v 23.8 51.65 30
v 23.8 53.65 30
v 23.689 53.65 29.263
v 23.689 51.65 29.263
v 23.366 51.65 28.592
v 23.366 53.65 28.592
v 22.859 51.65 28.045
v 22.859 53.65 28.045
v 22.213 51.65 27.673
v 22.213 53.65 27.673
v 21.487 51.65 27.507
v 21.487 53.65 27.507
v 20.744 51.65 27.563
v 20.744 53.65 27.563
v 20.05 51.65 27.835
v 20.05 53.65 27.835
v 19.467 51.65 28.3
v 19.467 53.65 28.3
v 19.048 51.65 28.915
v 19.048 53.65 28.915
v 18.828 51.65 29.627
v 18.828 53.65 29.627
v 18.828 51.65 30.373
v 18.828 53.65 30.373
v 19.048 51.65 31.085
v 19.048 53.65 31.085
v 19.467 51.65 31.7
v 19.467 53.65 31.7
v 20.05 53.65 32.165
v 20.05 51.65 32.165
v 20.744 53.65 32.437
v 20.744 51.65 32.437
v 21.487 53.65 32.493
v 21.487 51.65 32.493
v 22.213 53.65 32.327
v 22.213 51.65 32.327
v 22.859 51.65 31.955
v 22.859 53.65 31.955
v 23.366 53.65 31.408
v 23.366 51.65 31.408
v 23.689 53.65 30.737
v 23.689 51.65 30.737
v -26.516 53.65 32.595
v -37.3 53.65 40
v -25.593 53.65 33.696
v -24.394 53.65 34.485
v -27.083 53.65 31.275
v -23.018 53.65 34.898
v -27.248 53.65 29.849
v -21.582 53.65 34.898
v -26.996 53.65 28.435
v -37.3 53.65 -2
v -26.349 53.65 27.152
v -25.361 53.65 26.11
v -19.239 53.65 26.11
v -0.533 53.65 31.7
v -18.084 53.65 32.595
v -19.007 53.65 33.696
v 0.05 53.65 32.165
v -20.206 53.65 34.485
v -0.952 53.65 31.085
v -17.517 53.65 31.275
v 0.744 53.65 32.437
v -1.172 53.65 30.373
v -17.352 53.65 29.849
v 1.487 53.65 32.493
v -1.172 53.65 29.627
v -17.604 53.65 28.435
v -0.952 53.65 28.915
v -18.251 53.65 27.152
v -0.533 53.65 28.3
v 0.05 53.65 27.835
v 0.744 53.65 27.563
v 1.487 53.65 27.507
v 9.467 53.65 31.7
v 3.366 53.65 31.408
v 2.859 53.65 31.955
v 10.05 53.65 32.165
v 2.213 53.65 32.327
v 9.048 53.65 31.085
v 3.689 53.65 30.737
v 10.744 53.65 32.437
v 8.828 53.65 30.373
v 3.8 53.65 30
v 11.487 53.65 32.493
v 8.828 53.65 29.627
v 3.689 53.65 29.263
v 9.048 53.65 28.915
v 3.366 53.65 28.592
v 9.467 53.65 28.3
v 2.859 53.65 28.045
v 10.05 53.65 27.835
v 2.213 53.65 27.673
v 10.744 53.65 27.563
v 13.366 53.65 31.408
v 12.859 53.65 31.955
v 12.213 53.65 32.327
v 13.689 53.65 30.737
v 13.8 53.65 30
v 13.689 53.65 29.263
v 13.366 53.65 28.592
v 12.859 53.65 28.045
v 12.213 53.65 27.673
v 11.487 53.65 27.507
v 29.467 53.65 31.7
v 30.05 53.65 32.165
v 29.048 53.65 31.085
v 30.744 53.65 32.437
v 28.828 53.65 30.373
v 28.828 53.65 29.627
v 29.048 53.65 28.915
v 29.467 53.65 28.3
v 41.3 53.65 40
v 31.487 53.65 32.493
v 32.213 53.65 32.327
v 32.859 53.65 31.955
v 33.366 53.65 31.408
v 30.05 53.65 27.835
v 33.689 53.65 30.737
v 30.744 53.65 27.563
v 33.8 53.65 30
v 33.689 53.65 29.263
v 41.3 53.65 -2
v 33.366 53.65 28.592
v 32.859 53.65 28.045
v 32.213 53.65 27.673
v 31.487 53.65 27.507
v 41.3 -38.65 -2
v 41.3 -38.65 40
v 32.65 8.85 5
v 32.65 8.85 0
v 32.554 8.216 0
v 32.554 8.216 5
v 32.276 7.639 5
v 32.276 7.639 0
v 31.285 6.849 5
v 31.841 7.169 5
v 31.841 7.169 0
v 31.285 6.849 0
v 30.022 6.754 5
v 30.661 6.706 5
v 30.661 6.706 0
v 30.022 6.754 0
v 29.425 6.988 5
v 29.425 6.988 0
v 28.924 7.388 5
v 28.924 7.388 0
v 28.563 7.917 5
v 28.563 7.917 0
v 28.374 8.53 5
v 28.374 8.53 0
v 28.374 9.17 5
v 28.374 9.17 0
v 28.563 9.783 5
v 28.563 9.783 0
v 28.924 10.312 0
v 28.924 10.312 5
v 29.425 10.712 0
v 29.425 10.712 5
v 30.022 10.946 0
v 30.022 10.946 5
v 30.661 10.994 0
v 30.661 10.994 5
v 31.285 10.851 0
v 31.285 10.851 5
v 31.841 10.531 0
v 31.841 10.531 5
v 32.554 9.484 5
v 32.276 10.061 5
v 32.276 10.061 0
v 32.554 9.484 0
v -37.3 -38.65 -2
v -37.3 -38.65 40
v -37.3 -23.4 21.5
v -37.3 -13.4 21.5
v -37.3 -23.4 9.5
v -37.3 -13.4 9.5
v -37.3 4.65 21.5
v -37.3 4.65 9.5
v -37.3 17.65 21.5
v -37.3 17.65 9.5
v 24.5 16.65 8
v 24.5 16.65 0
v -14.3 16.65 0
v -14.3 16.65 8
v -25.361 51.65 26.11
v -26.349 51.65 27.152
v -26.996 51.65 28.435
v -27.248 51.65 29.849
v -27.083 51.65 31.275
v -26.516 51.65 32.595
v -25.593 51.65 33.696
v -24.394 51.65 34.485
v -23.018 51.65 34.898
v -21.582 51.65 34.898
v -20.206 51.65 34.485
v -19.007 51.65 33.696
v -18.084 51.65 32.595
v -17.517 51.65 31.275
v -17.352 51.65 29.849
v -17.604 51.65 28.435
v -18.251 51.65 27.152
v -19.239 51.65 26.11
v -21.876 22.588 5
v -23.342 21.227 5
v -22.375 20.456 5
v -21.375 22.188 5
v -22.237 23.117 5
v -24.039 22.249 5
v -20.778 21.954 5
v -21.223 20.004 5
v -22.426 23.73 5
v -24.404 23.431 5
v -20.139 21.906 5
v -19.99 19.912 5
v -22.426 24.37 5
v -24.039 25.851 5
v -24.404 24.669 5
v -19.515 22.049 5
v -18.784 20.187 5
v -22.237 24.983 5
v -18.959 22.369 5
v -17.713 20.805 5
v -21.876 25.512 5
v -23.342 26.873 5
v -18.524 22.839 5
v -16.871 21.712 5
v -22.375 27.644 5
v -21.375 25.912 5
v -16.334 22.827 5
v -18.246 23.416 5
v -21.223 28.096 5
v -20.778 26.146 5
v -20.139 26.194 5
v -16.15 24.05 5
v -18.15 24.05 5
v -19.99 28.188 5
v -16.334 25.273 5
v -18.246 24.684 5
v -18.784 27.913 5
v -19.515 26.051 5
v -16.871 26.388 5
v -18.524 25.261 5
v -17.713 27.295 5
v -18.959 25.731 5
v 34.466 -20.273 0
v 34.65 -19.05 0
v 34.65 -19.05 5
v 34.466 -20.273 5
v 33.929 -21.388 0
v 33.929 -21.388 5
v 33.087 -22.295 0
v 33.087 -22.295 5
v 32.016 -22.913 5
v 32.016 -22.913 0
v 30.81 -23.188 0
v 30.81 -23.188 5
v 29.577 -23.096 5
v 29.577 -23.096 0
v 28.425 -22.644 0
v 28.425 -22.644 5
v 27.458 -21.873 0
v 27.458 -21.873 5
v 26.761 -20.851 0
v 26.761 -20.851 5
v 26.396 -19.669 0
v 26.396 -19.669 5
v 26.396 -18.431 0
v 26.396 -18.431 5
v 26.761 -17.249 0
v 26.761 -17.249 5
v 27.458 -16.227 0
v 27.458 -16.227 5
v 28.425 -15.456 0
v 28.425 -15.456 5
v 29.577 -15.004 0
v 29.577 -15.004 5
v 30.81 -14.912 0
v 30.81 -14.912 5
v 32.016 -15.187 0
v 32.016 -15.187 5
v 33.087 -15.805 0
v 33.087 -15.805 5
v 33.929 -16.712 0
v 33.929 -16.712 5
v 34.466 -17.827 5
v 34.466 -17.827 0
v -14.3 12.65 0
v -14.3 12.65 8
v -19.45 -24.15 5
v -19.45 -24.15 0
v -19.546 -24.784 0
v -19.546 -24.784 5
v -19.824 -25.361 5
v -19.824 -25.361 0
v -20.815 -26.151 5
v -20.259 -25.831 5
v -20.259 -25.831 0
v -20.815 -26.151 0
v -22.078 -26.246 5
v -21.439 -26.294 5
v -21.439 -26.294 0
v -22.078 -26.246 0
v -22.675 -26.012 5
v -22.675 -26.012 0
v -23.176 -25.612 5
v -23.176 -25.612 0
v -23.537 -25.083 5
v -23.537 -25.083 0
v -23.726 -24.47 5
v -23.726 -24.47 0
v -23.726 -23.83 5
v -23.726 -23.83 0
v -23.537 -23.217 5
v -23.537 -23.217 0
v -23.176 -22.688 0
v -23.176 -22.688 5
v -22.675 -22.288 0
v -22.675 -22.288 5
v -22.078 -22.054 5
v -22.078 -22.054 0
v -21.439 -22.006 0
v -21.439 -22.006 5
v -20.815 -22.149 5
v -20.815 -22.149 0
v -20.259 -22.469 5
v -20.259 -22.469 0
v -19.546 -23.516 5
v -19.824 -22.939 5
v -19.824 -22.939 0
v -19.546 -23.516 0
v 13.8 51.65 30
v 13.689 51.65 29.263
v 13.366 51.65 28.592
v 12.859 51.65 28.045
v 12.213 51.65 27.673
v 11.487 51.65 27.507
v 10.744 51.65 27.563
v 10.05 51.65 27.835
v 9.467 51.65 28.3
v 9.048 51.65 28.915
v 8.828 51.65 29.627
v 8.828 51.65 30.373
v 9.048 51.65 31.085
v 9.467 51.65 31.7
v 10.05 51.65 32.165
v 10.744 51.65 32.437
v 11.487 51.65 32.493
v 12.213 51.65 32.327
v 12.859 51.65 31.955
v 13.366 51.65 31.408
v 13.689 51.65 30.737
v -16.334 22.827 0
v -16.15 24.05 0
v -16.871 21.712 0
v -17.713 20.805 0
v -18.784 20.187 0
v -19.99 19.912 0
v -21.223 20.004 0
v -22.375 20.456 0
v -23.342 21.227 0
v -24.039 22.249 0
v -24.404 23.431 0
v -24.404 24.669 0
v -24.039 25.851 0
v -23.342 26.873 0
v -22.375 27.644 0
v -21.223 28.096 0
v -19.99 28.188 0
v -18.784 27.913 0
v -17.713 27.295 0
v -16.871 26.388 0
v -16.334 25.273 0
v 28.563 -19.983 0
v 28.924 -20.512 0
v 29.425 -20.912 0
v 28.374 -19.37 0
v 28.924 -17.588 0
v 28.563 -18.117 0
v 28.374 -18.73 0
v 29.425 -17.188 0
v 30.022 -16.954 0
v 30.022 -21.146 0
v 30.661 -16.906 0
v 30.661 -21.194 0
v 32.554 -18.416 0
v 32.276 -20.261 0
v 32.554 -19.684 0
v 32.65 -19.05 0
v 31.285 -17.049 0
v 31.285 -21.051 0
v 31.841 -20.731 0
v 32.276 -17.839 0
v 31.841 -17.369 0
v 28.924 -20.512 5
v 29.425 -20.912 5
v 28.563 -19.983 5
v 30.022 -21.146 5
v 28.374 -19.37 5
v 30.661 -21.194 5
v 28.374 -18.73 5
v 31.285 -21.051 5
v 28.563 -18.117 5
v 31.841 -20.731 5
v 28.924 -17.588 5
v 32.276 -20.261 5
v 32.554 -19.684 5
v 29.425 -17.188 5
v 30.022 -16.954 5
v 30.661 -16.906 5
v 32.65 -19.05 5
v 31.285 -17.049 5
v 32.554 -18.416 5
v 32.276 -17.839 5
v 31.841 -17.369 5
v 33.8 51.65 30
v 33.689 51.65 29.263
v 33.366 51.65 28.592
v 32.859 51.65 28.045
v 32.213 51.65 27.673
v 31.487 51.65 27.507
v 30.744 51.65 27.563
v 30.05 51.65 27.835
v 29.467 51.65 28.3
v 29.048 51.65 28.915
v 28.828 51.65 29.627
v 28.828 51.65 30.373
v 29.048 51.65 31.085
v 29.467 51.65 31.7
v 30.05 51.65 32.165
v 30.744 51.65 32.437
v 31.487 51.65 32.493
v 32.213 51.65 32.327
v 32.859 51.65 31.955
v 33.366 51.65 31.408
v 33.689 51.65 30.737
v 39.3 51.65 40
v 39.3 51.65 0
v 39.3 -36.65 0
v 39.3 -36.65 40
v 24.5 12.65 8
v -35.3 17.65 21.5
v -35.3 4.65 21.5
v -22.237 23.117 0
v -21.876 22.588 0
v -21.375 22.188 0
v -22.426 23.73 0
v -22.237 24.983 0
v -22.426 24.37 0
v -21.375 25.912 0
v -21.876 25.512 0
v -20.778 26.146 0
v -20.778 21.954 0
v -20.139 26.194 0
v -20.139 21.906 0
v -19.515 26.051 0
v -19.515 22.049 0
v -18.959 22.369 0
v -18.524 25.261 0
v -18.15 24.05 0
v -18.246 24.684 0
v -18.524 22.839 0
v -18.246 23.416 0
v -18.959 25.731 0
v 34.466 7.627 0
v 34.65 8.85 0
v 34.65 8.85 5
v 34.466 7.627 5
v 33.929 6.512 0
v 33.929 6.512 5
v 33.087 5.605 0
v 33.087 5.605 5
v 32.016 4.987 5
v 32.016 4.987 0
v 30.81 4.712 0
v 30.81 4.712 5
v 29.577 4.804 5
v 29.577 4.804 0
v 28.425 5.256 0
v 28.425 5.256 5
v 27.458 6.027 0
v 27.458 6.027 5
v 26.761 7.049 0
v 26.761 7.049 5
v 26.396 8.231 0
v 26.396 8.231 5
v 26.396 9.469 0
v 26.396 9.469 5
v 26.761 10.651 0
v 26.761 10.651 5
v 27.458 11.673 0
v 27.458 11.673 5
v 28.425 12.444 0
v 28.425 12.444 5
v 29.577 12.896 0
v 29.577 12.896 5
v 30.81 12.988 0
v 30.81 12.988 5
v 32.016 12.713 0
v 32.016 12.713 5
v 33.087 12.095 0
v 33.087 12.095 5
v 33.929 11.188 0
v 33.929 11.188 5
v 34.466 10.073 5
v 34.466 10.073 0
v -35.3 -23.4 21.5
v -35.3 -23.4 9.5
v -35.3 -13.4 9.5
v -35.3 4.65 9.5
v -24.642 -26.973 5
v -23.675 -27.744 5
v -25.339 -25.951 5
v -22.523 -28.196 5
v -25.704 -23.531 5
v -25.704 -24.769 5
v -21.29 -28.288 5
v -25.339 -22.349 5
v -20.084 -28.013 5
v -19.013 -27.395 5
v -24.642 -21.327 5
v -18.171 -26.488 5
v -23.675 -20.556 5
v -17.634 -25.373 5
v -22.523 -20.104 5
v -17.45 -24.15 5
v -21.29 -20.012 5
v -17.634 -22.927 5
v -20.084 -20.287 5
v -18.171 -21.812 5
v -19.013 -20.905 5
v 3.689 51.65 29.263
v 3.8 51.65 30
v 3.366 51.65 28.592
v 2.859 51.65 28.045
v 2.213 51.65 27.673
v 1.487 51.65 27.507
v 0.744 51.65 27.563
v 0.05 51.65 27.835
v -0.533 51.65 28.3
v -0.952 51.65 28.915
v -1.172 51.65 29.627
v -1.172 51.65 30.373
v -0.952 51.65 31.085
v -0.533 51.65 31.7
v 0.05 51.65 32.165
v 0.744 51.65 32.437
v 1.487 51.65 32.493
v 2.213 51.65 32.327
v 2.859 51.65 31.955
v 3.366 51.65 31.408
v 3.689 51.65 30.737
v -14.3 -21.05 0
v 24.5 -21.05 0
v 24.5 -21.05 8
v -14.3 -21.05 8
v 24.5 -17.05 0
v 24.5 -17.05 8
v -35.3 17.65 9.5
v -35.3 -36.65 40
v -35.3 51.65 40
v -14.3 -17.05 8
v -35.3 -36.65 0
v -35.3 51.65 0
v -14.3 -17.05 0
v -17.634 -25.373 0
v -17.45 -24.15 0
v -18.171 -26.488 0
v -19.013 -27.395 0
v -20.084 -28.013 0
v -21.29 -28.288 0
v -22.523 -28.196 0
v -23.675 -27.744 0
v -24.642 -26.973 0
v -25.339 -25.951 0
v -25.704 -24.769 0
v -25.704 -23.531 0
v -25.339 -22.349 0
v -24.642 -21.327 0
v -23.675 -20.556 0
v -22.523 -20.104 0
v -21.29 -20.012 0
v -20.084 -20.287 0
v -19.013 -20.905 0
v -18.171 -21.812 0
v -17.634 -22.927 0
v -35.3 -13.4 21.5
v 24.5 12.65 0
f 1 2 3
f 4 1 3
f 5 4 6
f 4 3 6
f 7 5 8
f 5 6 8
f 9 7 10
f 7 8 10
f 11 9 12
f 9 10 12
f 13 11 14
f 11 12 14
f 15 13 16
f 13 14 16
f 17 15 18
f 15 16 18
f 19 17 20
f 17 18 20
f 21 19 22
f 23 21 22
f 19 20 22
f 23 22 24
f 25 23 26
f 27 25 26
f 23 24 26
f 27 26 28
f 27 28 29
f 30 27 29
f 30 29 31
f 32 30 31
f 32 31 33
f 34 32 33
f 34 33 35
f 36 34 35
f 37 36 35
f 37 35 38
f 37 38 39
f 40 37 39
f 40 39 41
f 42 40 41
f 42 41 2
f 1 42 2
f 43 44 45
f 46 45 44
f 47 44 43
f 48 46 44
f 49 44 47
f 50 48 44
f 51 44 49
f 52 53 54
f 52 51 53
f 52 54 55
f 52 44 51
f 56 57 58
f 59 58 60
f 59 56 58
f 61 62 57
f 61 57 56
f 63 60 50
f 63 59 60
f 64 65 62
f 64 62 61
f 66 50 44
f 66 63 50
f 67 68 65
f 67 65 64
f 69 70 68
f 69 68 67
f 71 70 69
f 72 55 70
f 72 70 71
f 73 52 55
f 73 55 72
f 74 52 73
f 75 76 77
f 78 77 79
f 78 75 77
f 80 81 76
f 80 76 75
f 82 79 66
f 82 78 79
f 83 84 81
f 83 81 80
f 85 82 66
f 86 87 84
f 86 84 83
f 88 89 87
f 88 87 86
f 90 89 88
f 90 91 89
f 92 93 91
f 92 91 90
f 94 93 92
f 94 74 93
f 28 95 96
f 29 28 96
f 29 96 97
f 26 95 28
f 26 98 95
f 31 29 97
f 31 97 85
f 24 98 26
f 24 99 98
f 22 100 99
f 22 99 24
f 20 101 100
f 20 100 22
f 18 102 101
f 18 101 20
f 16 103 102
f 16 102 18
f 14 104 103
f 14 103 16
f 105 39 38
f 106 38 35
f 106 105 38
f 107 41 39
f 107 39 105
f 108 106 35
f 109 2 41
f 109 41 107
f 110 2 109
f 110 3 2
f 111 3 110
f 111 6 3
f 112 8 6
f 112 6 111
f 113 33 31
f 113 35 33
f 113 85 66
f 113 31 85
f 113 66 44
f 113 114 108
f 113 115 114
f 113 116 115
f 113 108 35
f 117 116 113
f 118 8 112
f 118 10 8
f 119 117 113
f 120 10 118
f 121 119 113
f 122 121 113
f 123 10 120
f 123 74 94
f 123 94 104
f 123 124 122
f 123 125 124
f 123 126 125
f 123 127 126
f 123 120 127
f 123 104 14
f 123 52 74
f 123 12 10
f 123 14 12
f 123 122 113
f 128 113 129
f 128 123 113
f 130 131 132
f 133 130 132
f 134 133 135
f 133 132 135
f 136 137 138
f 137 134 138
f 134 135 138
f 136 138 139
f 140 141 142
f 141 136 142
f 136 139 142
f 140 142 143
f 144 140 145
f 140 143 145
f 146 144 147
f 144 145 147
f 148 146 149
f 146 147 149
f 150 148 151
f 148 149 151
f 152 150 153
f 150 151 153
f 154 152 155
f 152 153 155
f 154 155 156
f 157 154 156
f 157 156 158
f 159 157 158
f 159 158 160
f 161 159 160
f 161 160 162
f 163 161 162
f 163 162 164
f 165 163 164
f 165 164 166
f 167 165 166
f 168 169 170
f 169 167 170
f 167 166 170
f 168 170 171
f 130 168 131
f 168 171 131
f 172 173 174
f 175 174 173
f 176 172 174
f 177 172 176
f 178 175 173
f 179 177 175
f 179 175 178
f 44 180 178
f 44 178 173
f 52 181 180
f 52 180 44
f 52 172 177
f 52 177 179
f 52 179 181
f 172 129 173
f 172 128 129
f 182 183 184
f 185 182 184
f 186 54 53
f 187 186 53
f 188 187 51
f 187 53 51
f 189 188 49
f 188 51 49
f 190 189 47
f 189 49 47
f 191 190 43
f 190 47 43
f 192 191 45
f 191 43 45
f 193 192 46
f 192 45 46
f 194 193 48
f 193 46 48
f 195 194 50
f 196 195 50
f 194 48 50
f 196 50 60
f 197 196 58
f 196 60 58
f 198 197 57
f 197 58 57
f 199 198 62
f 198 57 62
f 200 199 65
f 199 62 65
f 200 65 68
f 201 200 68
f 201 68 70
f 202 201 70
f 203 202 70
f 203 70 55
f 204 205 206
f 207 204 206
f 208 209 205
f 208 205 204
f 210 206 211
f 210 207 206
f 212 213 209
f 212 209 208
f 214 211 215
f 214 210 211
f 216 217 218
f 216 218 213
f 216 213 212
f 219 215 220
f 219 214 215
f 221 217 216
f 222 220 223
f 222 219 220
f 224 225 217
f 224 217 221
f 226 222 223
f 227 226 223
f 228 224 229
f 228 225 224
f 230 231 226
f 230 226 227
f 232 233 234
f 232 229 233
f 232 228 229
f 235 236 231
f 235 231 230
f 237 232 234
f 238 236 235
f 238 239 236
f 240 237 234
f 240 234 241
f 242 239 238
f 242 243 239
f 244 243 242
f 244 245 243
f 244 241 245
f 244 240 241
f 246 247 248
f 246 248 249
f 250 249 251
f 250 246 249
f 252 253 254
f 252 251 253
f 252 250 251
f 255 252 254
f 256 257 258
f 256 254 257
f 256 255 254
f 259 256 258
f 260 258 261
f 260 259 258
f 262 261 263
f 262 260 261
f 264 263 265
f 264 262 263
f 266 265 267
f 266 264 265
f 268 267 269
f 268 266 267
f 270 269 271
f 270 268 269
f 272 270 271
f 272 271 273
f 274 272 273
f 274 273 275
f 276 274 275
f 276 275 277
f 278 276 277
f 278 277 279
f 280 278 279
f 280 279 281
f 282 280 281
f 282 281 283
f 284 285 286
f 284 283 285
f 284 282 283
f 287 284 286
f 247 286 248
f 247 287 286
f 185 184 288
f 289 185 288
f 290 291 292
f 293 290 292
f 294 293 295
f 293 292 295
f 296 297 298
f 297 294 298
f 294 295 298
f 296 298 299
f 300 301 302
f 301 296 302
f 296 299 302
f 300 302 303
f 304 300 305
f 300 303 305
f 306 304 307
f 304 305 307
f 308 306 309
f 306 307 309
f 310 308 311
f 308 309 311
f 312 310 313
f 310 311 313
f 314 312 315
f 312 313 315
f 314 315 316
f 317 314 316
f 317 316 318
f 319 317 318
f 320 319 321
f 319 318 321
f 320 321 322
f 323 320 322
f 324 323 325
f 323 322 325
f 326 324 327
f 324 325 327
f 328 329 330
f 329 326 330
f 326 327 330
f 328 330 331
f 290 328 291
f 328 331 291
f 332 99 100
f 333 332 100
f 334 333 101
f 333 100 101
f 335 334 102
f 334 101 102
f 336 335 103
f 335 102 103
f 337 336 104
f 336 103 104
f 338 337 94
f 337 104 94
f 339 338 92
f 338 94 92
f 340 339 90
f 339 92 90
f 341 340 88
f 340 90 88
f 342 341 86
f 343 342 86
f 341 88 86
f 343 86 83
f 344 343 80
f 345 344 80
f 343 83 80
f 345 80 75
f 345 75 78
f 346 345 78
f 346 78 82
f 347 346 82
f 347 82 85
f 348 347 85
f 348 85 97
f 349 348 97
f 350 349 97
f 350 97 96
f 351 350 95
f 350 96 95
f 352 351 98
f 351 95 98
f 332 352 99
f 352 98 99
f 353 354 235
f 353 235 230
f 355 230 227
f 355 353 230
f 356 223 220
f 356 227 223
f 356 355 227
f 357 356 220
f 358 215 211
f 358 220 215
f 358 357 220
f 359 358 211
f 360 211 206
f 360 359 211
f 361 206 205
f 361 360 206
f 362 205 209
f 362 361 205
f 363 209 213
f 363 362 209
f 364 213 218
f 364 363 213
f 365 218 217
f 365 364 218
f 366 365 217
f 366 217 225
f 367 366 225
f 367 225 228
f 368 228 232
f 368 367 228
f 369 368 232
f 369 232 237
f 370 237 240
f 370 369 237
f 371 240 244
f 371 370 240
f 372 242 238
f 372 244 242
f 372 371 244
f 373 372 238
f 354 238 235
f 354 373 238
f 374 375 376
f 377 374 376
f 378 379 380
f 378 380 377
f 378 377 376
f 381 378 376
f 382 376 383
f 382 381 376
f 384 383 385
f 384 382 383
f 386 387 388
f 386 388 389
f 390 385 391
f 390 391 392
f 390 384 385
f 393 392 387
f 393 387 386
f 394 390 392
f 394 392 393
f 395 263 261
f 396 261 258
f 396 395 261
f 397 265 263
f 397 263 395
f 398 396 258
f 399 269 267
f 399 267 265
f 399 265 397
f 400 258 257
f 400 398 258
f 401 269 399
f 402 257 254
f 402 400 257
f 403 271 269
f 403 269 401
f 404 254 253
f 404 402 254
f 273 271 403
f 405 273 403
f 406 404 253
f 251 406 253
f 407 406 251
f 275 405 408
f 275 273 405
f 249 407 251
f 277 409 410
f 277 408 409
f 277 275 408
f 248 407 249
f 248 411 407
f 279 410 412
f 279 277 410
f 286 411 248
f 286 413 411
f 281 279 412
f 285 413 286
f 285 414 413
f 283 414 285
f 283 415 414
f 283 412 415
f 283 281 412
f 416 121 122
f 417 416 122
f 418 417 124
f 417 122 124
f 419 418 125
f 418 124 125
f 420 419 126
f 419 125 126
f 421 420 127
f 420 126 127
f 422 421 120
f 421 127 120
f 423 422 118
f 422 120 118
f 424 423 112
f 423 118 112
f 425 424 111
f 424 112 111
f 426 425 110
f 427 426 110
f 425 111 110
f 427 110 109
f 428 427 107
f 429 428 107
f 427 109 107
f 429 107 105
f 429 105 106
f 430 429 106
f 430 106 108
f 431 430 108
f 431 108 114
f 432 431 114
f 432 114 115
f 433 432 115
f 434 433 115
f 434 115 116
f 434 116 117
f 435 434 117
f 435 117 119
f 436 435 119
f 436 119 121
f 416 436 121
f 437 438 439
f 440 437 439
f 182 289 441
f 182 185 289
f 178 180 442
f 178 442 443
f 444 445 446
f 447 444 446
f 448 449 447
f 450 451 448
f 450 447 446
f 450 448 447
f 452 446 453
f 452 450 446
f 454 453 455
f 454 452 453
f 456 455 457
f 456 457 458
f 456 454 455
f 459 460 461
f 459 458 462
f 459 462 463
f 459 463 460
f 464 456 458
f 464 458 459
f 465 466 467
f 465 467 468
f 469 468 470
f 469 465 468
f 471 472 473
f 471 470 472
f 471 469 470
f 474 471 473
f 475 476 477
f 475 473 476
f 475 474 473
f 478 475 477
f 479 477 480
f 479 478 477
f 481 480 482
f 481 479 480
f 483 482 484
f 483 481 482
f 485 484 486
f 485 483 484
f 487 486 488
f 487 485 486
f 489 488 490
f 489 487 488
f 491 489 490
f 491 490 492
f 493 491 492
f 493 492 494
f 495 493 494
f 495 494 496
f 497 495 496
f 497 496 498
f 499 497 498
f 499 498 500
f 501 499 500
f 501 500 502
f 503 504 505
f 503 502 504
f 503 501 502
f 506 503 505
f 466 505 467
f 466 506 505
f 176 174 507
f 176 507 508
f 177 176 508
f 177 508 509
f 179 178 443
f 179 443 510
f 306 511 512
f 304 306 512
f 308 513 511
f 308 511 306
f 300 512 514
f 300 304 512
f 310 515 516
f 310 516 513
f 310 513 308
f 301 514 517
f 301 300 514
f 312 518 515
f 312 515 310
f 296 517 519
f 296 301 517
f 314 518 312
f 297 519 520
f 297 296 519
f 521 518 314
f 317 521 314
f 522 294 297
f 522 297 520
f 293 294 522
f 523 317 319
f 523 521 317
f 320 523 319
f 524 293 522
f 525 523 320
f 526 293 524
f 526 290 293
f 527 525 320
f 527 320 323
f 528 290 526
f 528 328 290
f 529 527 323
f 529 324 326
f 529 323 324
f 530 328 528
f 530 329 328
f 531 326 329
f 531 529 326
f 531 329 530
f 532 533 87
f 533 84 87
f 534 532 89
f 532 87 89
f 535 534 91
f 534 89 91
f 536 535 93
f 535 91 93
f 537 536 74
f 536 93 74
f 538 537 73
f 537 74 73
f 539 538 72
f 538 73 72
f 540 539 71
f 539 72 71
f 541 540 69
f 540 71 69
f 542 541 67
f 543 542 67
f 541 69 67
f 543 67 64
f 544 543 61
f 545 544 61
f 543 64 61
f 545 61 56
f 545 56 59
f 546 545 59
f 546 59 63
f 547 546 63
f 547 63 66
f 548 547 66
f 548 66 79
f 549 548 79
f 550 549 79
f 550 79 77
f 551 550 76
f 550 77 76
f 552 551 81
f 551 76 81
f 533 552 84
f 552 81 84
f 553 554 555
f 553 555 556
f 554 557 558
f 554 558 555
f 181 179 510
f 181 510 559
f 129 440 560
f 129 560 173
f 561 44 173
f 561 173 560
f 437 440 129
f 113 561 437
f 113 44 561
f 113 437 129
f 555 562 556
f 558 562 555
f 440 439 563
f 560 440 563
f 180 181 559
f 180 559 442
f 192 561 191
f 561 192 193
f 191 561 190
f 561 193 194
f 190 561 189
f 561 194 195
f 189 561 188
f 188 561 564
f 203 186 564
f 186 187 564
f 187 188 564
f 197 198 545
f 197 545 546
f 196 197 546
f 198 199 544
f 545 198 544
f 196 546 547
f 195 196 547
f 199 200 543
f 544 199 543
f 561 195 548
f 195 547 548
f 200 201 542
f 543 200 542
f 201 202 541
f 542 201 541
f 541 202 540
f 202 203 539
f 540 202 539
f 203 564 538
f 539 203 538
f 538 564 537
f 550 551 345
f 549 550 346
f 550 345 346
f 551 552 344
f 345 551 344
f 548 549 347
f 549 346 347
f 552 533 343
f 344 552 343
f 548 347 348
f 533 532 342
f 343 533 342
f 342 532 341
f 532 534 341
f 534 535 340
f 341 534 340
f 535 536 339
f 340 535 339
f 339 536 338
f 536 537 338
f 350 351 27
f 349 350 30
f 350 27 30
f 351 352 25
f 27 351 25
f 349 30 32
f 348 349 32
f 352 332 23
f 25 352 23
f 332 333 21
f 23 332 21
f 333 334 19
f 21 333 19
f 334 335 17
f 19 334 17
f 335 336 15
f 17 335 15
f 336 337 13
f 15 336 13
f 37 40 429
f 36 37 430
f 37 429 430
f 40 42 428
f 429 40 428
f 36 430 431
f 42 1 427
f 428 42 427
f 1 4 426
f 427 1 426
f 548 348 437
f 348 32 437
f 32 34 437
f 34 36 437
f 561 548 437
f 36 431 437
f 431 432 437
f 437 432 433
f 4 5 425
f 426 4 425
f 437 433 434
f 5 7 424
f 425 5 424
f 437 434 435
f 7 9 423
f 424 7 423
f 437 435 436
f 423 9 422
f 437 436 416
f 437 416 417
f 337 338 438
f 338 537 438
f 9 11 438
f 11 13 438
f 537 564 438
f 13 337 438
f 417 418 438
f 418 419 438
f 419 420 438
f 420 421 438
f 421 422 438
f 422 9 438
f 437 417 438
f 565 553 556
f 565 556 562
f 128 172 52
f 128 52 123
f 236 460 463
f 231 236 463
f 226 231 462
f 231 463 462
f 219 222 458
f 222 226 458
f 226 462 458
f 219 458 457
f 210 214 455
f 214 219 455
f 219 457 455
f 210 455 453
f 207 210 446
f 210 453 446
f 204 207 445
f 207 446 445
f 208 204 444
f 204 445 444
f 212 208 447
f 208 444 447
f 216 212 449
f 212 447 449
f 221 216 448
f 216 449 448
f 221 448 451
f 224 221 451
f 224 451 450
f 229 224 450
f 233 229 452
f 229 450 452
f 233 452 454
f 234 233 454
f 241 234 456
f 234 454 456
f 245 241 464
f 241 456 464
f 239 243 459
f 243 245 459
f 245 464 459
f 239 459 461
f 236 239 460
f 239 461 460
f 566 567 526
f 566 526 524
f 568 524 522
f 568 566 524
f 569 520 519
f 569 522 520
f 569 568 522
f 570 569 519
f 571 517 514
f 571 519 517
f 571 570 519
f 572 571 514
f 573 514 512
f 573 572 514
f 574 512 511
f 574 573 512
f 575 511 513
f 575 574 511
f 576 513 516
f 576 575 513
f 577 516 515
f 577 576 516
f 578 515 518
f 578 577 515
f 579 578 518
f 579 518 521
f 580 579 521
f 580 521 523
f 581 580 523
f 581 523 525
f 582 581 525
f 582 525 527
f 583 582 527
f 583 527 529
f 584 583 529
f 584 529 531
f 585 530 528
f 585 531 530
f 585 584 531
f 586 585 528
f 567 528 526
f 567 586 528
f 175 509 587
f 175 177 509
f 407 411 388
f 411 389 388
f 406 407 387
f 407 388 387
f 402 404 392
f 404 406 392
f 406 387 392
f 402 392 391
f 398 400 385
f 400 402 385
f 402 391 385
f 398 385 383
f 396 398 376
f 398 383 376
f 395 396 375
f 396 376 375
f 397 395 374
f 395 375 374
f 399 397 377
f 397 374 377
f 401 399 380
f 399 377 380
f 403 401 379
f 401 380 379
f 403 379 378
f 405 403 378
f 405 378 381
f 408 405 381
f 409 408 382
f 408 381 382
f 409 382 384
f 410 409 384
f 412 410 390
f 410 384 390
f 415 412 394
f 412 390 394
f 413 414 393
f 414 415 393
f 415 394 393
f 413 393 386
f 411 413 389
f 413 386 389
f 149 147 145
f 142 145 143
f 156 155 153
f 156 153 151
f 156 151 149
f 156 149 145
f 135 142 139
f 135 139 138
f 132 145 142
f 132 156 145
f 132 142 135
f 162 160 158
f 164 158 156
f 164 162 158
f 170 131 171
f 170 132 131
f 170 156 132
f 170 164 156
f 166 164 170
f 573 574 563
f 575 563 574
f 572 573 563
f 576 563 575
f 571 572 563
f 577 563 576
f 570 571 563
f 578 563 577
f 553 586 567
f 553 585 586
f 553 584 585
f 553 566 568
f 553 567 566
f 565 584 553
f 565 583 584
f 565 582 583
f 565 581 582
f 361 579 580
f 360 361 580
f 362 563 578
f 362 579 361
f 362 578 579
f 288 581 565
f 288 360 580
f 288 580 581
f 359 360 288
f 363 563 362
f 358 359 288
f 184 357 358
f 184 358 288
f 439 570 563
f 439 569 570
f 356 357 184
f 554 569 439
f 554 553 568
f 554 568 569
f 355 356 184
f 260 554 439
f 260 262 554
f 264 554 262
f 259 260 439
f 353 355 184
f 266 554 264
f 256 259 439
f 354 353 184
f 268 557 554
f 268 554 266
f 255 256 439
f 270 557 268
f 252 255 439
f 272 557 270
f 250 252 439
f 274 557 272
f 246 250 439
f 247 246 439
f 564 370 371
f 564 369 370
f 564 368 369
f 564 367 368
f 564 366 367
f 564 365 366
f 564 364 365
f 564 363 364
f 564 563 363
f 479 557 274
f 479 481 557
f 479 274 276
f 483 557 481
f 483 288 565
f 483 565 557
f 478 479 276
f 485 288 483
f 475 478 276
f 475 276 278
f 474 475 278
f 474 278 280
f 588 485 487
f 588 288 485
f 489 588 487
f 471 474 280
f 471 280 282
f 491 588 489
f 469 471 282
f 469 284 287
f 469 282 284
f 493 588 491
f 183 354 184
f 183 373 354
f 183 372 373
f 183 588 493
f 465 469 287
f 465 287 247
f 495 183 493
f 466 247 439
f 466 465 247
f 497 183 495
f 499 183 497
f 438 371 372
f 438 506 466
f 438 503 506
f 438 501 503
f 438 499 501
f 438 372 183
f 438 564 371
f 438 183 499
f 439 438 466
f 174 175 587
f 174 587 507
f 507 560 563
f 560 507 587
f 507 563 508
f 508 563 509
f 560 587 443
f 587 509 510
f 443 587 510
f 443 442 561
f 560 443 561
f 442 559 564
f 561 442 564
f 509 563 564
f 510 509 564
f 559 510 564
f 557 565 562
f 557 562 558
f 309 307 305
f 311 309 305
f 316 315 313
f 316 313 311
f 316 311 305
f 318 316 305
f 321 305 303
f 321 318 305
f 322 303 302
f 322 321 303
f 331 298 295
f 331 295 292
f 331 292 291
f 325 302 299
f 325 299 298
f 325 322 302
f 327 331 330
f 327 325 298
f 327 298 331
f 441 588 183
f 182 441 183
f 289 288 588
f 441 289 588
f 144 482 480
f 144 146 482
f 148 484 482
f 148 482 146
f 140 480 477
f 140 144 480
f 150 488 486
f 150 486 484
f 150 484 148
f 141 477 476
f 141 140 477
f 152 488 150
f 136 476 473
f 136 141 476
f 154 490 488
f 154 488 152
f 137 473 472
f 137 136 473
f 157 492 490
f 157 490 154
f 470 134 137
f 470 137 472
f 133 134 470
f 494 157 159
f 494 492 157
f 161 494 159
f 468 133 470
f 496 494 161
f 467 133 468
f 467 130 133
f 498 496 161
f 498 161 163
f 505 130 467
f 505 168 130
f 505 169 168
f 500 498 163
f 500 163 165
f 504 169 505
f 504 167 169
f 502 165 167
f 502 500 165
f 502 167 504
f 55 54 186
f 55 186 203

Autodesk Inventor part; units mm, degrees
ref_plane "YZ Plane" through (0, 0, 0) normal (1, 0, 0) x (0, 1, 0)
ref_plane "XZ Plane" through (0, 0, 0) normal (0, 1, 0) x (-1, 0, 0)
ref_plane "XY Plane" through (0, 0, 0) normal (0, 0, 1) x (1, 0, 0)
sketch "Sketch1" plane through (0, 0, 0) normal (0, 0, 1) x (1, 0, 0)
  line L0 (-35.3, 51.65) -> (39.3, 51.65)
  line L1 (39.3, 51.65) -> (39.3, -36.65)
  line L2 (39.3, -36.65) -> (-35.3, -36.65)
  line L3 (-35.3, -36.65) -> (-35.3, 51.65)
  line L4 (-35.3, 51.65) -> (39.3, -36.65) construction
  line L5 (39.3, 51.65) -> (-35.3, -36.65) construction
  line L6 (34.3, 26.65) -> (-34.3, 26.65) construction
  line L7 (-34.3, 26.65) -> (-34.3, -26.65) construction
  line L8 (-34.3, -26.65) -> (34.3, -26.65) construction
  line L9 (34.3, -26.65) -> (34.3, 26.65) construction
  line L10 (34.3, 26.65) -> (-34.3, -26.65) construction
  line L11 (-34.3, 26.65) -> (34.3, -26.65) construction
  circle A0 centre (-20.3, 24.05) radius 1.6 construction
  circle A1 centre (-21.6, -24.15) radius 1.6 construction
  circle A2 centre (30.5, 8.85) radius 1.6 construction
  circle A3 centre (30.5, -19.05) radius 1.6 construction
  line L12 (-37.3, 53.65) -> (41.3, 53.65)
  line L13 (41.3, 53.65) -> (41.3, -38.65)
  line L14 (41.3, -38.65) -> (-37.3, -38.65)
  line L15 (-37.3, -38.65) -> (-37.3, 53.65)
  line L16 (-37.3, 53.65) -> (41.3, -38.65) construction
  line L17 (41.3, 53.65) -> (-37.3, -38.65) construction
  line L18 (30.5, 53.65) -> (30.5, -38.65) construction
  point P0 (0, 0)
  dimension "d82" = 6
  dimension "d0" = 53.3
  dimension "d2" = 68.6
  dimension "d3" = 14
  dimension "d4" = 2.5
  dimension "d5" = 50.8
  dimension "d6" = 27.9
  dimension "d7" = 5.1
  dimension "d8" = 3.2
  dimension "d9" = 25
  dimension "d10" = 1
  dimension "d11" = 2
  dimension "d12" = 2
  dimension "d59" = 5
  dimension "d62" = 10
  dimension "d63" = 2
  dimension "d64" = 2
  dimension "d92" = 15.2
  dimension "d94" = 1.3
extrude "Extrusion1" add sketch "Sketch1" against normal blind 2 contours L0 L1 L2 L3 | L12 L13 L14 L15
extrude "Extrusion2" add sketch "Sketch1" along normal blind 40
sketch "Sketch2" plane through (0, 0, 0) normal (0, 0, 1) x (1, 0, 0)
  circle A0 centre (-21.6, -24.15) radius 1.6 construction
  circle A1 centre (-20.3, 24.05) radius 4.15
  circle A2 centre (-21.6, -24.15) radius 4.15
  circle A3 centre (30.5, -19.05) radius 4.15
  circle A4 centre (30.5, 8.85) radius 4.15
  circle A5 centre (-20.3, 24.05) radius 2.15
  circle A6 centre (30.5, 8.85) radius 2.15
  circle A7 centre (-21.6, -24.15) radius 2.15
  circle A8 centre (30.5, -19.05) radius 2.15
  point P0 (0, 0)
  dimension "d17" = 8.3
  dimension "d19" = 4.3
extrude "Extrusion3" add sketch "Sketch2" along normal blind 5
sketch "Sketch7" plane through (0, 0, 0) normal (0, 0, 1) x (1, 0, 0)
  circle A0 centre (30.5, -19.05) radius 4.15 projected
  circle A1 centre (30.5, 8.85) radius 4.15 projected
  line L0 (-14.3, -17.05) -> (24.5, -17.05)
  line L1 (24.5, -17.05) -> (24.5, -21.05)
  line L2 (24.5, -21.05) -> (-14.3, -21.05)
  line L3 (-14.3, -21.05) -> (-14.3, -17.05)
  line L4 (-34.3, -26.65) -> (34.3, -26.65) construction
  line L5 (34.3, 26.65) -> (-34.3, 26.65) construction
  line L6 (34.3, -26.65) -> (34.3, 26.65) construction
  line L7 (-34.3, 26.65) -> (-34.3, -26.65) construction
  line L8 (24.5, 16.65) -> (-14.3, 16.65)
  line L9 (-14.3, 16.65) -> (-14.3, 12.65)
  line L10 (-14.3, 12.65) -> (24.5, 12.65)
  line L11 (24.5, 12.65) -> (24.5, 16.65)
  point P0 (0, 0)
  point P1 (24.5, -19.05)
  dimension "d79" = 4
  dimension "d80" = 20
  dimension "d81" = 6
  dimension "d82" = 6
  dimension "d83" = 20
  dimension "d86" = 10
  dimension "d87" = 0
extrude "Extrusion7" add sketch "Sketch7" along normal blind 8 contours L0 L1 L2 L3 | L11 L10 L9 L8
sketch "Sketch4" plane through (-37.3, -38.65, -2) normal (-1, 0, 0) x (0, 0, 1)
  line L0 (11.5, 56.3) -> (23.5, 56.3)
  line L1 (23.5, 56.3) -> (23.5, 43.3)
  line L2 (23.5, 43.3) -> (11.5, 43.3)
  line L3 (11.5, 43.3) -> (11.5, 56.3)
  line L4 (11.5, 56.3) -> (23.5, 43.3) construction
  line L5 (23.5, 56.3) -> (11.5, 43.3) construction
  line L6 (23.5, 15.25) -> (11.5, 15.25)
  line L7 (11.5, 15.25) -> (11.5, 25.25)
  line L8 (11.5, 25.25) -> (23.5, 25.25)
  line L9 (23.5, 25.25) -> (23.5, 15.25)
  line L10 (23.5, 15.25) -> (11.5, 25.25) construction
  line L11 (11.5, 15.25) -> (23.5, 25.25) construction
  line L12 (2, 0) -> (2, 92.3) projected
  line L13 (7, 58.55) -> (7, 66.85) projected
  line L14 (10, 21.6) -> (10, 17.6) projected
  line L15 (0, 92.3) -> (42, 92.3) projected
  line L16 (0, 0) -> (0, 92.3) projected
  line L17 (42, 0) -> (0, 0) projected
  line L18 (42, 92.3) -> (42, 0) projected
  point P0 (2, 38.65)
  point P1 (2, 65.3)
  point P2 (2, 65.3)
  point P3 (2, 65.3)
  point P4 (2, 12)
  point P5 (2, 12)
  point P6 (2, 12)
  point P7 (17.5, 49.8)
  point P8 (17.5, 20.25)
  point P9 (2, 107.3)
  dimension "d22" = 13
  dimension "d24" = 12
  dimension "d26" = 9
  dimension "d27" = 12
  dimension "d28" = 10
  dimension "d31" = 3.25
  dimension "d88" = 1.5
  dimension "d90" = 1.5
extrude "Extrusion4" cut sketch "Sketch4" against normal up to surface (2 mm away) contours L0 L1 L2 L3 | L6 L7 L8 L9
sketch "Sketch8" plane through (-37.3, 53.65, -2) normal (0, 1, 0) x (1, 0, 0)
  line L0 (15, -32) -> (15, -28.11) construction
  line L1 (11.9389, -28.11) -> (18.0611, -28.11)
  arc A0 (11.9389, -28.11) -> (18.0611, -28.11) centre (15, -32) ccw
  line L2 (78.6, -42) -> (78.6, 0) construction
  line L3 (0, 0) -> (78.6, 0) construction
  line L4 (0, 0) -> (0, -42) construction
  line L5 (78.6, -42) -> (0, -42) construction
  line L6 (78.6, -42) -> (78.6, 0) construction
  line L7 (78.6, -32) -> (0, -32) construction
  line L8 (0, 0) -> (0, -42) construction
  circle A1 centre (68.6, -32) radius 2.5
  circle A2 centre (58.6, -32) radius 2.5
  circle A3 centre (48.6, -32) radius 2.5
  circle A4 centre (38.6, -32) radius 2.5
  point P0 (37.3, -2)
  dimension "d97" = 9.9
  dimension "d98" = 3.89
  dimension "d99" = 10
  dimension "d100" = 15
  dimension "d101" = 5
  dimension "d104" = 10
  dimension "d109" = 10
extrude "Extrusion8" cut sketch "Sketch8" against normal up to next
properties part number "Arduino SMB-BNC box"
